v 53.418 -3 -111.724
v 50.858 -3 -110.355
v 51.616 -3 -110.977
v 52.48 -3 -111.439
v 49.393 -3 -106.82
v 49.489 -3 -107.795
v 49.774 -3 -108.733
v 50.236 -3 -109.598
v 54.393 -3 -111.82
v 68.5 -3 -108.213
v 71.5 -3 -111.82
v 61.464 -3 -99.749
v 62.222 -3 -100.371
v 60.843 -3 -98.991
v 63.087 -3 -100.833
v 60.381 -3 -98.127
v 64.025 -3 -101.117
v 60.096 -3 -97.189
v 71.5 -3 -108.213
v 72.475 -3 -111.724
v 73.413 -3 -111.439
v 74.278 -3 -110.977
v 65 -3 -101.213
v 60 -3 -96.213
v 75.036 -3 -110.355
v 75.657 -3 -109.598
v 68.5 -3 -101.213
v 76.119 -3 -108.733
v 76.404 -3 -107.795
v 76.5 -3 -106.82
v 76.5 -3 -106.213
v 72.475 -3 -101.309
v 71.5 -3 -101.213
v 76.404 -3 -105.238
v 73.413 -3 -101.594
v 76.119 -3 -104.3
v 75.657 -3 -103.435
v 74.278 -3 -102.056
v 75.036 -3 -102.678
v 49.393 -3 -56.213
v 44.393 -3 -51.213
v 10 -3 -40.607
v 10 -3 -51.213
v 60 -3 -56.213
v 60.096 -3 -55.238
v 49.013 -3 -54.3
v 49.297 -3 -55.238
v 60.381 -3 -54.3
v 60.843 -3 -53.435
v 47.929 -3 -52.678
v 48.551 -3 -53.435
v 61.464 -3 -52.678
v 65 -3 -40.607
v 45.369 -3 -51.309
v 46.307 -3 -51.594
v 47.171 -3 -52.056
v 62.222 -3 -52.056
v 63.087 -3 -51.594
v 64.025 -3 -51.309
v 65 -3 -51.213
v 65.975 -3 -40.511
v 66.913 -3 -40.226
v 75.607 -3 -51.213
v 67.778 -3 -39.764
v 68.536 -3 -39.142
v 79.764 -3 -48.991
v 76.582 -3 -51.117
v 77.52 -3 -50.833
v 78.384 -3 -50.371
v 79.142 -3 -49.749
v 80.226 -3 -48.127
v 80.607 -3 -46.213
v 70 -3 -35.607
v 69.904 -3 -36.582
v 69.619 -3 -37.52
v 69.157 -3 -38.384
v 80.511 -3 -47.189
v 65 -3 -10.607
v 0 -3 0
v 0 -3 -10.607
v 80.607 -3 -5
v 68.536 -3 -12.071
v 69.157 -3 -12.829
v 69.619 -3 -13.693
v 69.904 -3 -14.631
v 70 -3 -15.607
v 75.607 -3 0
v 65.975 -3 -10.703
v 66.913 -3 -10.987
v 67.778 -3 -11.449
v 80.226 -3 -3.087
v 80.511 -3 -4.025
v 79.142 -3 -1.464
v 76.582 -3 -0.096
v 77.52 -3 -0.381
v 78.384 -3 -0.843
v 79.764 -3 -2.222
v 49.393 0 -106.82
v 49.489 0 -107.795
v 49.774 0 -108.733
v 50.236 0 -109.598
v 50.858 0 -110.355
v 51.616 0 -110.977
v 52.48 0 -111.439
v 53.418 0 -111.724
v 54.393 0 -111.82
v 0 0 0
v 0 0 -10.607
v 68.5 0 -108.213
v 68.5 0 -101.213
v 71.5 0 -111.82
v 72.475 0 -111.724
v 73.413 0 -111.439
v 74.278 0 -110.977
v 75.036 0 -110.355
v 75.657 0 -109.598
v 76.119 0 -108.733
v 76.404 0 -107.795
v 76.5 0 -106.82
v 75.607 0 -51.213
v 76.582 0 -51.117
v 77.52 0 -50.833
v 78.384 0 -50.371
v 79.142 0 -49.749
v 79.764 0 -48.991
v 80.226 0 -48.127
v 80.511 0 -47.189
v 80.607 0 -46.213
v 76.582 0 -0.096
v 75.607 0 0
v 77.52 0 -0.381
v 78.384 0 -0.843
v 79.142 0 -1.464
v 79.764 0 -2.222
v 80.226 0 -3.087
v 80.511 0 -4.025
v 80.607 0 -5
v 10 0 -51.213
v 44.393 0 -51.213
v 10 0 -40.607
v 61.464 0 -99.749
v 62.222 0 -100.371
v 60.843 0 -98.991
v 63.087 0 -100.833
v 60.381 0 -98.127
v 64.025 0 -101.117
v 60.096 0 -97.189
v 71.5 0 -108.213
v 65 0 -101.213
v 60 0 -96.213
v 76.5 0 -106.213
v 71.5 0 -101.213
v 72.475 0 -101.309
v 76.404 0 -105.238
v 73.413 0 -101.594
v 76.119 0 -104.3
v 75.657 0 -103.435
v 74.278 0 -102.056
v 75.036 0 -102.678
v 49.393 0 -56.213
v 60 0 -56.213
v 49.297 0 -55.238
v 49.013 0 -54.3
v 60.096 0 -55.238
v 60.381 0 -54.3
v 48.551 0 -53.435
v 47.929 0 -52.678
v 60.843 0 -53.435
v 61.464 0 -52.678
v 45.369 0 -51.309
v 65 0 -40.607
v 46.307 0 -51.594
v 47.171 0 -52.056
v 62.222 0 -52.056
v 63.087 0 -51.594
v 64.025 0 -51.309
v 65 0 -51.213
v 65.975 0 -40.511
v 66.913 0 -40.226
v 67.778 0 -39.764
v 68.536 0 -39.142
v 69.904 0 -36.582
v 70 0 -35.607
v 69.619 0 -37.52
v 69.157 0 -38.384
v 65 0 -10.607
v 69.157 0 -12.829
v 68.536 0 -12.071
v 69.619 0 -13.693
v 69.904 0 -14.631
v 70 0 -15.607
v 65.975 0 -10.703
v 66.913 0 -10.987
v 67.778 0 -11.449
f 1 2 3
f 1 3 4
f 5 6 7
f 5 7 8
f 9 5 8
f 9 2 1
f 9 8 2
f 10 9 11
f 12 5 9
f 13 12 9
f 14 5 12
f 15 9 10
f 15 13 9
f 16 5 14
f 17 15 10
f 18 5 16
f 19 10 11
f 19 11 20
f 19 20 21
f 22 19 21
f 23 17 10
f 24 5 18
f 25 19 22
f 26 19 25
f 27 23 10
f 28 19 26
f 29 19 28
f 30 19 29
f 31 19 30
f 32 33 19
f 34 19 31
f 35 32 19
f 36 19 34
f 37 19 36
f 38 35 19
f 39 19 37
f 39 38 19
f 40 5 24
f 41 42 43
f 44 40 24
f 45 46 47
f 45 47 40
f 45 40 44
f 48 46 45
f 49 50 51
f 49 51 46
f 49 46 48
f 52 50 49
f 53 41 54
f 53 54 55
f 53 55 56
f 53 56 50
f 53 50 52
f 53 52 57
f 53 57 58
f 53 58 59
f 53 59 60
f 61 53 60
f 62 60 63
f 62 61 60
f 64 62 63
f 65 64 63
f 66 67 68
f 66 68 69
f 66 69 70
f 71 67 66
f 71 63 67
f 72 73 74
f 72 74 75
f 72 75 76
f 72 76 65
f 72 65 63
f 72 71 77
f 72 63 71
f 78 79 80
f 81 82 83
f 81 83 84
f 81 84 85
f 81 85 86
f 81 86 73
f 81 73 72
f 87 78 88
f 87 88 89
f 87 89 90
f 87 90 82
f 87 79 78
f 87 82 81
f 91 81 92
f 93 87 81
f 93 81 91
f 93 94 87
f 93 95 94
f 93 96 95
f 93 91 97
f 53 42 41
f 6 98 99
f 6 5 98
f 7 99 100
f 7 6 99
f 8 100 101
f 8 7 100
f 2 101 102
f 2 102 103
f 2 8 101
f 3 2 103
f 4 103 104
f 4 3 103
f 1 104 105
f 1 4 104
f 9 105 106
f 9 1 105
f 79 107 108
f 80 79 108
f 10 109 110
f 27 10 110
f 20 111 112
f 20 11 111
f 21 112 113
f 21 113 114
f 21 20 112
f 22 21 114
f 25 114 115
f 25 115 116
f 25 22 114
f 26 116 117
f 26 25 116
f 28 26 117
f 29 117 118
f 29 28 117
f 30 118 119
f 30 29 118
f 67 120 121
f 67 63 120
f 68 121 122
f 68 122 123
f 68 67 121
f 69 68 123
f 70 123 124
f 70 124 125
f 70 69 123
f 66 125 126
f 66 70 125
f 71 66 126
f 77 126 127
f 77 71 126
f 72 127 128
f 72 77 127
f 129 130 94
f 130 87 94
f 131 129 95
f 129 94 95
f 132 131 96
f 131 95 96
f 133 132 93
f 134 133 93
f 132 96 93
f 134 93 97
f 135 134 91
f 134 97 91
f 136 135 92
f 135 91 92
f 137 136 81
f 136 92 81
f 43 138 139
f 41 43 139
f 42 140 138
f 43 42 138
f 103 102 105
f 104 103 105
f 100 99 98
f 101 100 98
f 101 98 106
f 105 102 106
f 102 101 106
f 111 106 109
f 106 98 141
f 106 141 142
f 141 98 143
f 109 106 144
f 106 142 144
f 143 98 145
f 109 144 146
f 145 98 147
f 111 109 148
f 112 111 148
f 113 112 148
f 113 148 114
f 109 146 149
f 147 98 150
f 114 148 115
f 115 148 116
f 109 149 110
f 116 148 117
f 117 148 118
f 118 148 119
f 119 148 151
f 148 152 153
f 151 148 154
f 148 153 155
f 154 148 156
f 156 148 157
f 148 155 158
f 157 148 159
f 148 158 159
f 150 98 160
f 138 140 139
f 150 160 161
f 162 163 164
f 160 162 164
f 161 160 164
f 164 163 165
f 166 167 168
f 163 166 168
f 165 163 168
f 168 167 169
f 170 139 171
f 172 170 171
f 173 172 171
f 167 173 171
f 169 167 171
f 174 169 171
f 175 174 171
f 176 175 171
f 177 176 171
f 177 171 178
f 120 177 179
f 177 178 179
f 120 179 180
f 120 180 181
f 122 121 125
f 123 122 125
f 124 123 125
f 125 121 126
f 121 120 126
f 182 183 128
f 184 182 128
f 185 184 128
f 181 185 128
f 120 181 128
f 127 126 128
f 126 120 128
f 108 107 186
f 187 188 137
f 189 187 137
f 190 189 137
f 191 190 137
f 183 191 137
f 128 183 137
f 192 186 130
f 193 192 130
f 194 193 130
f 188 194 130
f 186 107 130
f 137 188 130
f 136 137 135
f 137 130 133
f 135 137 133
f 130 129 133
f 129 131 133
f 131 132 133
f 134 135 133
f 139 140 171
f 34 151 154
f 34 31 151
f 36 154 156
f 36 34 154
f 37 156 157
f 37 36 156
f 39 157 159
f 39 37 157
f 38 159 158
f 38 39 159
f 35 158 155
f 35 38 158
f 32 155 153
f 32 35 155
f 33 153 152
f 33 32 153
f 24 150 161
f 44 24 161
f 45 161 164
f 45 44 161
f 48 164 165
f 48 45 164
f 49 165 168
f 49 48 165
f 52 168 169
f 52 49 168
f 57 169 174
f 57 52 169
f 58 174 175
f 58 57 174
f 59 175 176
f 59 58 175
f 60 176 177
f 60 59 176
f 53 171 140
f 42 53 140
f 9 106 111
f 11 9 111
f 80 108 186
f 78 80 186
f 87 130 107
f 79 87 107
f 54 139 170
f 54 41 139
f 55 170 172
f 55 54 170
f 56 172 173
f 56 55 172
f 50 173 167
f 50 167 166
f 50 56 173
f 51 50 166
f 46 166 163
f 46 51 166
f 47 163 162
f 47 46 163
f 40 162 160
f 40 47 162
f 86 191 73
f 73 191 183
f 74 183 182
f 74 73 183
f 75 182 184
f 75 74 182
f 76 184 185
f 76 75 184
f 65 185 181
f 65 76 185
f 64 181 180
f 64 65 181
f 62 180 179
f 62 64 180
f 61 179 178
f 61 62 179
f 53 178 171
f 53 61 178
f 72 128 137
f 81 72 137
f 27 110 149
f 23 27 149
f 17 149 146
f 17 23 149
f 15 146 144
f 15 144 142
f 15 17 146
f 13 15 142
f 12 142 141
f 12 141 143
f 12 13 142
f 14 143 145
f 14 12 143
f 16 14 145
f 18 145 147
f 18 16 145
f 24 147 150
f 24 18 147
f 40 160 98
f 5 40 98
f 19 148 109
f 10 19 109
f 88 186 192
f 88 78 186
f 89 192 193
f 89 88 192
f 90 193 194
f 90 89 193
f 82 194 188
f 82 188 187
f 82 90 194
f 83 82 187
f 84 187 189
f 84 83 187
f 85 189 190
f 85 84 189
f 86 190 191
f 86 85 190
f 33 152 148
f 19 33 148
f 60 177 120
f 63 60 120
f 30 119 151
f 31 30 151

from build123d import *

# Parameters (mm, degrees)
F1_DEPTH = 3
F2_R     = 4.99999


# Not quite as in the source:
# - a fillet or chamfer is up to 0.001 mm smaller than in the source, because OpenCascade refuses the exact size


with BuildPart() as f1:
    # F0 (on Front) → F1 (new body)
    with BuildSketch(Plane.XZ):
        Polygon((80.6066017178, 0), (0, 0), (0, -10.6066017178), (70, -10.6066017178), (70, -40.6066017178), (10, -40.6066017178), (10, -51.2132034356), (49.3933982822, -51.2132034356), (49.3933982822, -111.8198051534), (76.5, -111.8198051534), (76.5, -101.2132034356), (71.5, -101.2132034356), (71.5, -108.2132034356), (68.5, -108.2132034356), (68.5, -101.2132034356), (60, -101.2132034356), (60, -51.2132034356), (80.6066017178, -51.2132034356), align=None)
    extrude(amount=F1_DEPTH)

    # F2 (radius 5 in the source; OpenCascade refuses exactly that, so slightly less here)
    f2_edges = [f1.edges().sort_by_distance(p)[0] for p in [
        (49.393398, -1.5, -51.213203),
        (70, -1.5, -10.606602),
        (70, -1.5, -40.606602),
        (80.606602, -1.5, 0),
        (80.606602, -1.5, -51.213203),
        (60, -1.5, -51.213203),
        (60, -1.5, -101.213203),
        (76.5, -1.5, -101.213203),
        (76.5, -1.5, -111.819805),
        (49.393398, -1.5, -111.819805),
    ]]
    fillet(f2_edges, radius=F2_R)


solid = f1.part
